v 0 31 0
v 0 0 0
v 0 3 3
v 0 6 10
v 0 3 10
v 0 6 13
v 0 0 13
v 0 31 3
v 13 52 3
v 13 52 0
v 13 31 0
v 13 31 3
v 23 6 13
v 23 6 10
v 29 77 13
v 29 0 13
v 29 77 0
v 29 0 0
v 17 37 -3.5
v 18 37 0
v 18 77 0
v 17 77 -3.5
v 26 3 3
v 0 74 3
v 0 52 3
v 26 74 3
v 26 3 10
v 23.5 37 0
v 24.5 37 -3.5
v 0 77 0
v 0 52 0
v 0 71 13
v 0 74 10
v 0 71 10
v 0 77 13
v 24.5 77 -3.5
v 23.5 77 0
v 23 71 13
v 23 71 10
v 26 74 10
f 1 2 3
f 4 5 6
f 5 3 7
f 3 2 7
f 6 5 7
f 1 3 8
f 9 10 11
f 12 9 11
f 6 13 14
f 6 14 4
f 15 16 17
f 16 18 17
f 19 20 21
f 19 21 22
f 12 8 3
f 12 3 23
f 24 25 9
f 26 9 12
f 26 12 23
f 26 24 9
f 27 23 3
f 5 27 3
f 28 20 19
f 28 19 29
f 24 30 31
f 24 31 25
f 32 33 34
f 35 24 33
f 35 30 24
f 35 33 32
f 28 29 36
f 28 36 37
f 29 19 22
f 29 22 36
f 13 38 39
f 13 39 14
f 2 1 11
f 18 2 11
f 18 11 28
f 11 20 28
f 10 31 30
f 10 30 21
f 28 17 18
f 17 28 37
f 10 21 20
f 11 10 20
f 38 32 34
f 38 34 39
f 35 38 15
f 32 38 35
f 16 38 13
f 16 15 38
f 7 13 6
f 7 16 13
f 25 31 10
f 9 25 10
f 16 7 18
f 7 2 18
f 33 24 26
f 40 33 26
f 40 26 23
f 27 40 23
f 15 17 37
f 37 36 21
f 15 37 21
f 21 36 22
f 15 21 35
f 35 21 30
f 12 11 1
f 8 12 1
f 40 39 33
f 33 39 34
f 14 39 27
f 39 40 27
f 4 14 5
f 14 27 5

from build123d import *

# Parameters (mm, degrees)
F1_DEPTH  = 3
F3_DEPTH  = 10
F4_W      = 71
F4_H      = 3
F5_DEPTH  = 3
F6_W      = 23
F6_H      = 3
F7_DEPTH  = 3
F8_W      = 23
F8_H      = 3
F9_DEPTH  = 3
F10_W     = 7.5
F10_H     = 40
F11_DEPTH = 3.5
F13_DEPTH = 40
F14_DEPTH = 40


with BuildPart() as f1:
    # F0 (on Top) → F1 (new body)
    with BuildSketch(Plane.XY):
        Polygon((0, 31), (0, 0), (29, 0), (29, 77), (0, 77), (0, 52), (13, 52), (13, 31), align=None)
    extrude(amount=F1_DEPTH)

    # F2 (on face) → F3 (join)
    with BuildSketch(Plane.XY.offset(3)):
        Polygon((26, 3), (0, 3), (0, 0), (29, 0), (29, 77), (0, 77), (0, 74), (26, 74), align=None)
    extrude(amount=F3_DEPTH)

    # F4 (on face) → F5 (join)
    with BuildSketch(Plane(origin=(26, 0, 0), x_dir=(0, -1, 0), z_dir=(-1, 0, 0))):
        with Locations((-38.5, 11.5)):
            Rectangle(F4_W, F4_H)
    extrude(amount=F5_DEPTH)

    # F6 (on face) → F7 (join)
    with BuildSketch(Plane.XZ.offset(-74)):
        with Locations((11.5, 11.5)):
            Rectangle(F6_W, F6_H)
    extrude(amount=F7_DEPTH)

    # F8 (on face) → F9 (join)
    with BuildSketch(Plane(origin=(0, 3, 0), x_dir=(-1, 0, 0), z_dir=(0, 1, 0))):
        with Locations((-11.5, 11.5)):
            Rectangle(F8_W, F8_H)
    extrude(amount=F9_DEPTH)

    # F10 (on face) → F11 (join)
    with BuildSketch(Plane(origin=(0, 0, 0), x_dir=(1, 0, 0), z_dir=(0, 0, -1))):
        with Locations((20.75, -57)):
            Rectangle(F10_W, F10_H)
    extrude(amount=F11_DEPTH)

    # F12 (on face) → F13 (cut)
    with BuildSketch(Plane(origin=(0, 77, 0), x_dir=(-1, 0, 0), z_dir=(0, 1, 0))):
        Polygon((-24.5, 0), (-24.5, -3.5), (-23.5, 0), align=None)
    extrude(amount=-F13_DEPTH, mode=Mode.SUBTRACT)

    # F12 (on face) → F14 (cut)
    with BuildSketch(Plane(origin=(0, 77, 0), x_dir=(-1, 0, 0), z_dir=(0, 1, 0))):
        Polygon((-18, 0), (-17, -3.5), (-17, 0), align=None)
    extrude(amount=-F14_DEPTH, mode=Mode.SUBTRACT)


solid = f1.part
